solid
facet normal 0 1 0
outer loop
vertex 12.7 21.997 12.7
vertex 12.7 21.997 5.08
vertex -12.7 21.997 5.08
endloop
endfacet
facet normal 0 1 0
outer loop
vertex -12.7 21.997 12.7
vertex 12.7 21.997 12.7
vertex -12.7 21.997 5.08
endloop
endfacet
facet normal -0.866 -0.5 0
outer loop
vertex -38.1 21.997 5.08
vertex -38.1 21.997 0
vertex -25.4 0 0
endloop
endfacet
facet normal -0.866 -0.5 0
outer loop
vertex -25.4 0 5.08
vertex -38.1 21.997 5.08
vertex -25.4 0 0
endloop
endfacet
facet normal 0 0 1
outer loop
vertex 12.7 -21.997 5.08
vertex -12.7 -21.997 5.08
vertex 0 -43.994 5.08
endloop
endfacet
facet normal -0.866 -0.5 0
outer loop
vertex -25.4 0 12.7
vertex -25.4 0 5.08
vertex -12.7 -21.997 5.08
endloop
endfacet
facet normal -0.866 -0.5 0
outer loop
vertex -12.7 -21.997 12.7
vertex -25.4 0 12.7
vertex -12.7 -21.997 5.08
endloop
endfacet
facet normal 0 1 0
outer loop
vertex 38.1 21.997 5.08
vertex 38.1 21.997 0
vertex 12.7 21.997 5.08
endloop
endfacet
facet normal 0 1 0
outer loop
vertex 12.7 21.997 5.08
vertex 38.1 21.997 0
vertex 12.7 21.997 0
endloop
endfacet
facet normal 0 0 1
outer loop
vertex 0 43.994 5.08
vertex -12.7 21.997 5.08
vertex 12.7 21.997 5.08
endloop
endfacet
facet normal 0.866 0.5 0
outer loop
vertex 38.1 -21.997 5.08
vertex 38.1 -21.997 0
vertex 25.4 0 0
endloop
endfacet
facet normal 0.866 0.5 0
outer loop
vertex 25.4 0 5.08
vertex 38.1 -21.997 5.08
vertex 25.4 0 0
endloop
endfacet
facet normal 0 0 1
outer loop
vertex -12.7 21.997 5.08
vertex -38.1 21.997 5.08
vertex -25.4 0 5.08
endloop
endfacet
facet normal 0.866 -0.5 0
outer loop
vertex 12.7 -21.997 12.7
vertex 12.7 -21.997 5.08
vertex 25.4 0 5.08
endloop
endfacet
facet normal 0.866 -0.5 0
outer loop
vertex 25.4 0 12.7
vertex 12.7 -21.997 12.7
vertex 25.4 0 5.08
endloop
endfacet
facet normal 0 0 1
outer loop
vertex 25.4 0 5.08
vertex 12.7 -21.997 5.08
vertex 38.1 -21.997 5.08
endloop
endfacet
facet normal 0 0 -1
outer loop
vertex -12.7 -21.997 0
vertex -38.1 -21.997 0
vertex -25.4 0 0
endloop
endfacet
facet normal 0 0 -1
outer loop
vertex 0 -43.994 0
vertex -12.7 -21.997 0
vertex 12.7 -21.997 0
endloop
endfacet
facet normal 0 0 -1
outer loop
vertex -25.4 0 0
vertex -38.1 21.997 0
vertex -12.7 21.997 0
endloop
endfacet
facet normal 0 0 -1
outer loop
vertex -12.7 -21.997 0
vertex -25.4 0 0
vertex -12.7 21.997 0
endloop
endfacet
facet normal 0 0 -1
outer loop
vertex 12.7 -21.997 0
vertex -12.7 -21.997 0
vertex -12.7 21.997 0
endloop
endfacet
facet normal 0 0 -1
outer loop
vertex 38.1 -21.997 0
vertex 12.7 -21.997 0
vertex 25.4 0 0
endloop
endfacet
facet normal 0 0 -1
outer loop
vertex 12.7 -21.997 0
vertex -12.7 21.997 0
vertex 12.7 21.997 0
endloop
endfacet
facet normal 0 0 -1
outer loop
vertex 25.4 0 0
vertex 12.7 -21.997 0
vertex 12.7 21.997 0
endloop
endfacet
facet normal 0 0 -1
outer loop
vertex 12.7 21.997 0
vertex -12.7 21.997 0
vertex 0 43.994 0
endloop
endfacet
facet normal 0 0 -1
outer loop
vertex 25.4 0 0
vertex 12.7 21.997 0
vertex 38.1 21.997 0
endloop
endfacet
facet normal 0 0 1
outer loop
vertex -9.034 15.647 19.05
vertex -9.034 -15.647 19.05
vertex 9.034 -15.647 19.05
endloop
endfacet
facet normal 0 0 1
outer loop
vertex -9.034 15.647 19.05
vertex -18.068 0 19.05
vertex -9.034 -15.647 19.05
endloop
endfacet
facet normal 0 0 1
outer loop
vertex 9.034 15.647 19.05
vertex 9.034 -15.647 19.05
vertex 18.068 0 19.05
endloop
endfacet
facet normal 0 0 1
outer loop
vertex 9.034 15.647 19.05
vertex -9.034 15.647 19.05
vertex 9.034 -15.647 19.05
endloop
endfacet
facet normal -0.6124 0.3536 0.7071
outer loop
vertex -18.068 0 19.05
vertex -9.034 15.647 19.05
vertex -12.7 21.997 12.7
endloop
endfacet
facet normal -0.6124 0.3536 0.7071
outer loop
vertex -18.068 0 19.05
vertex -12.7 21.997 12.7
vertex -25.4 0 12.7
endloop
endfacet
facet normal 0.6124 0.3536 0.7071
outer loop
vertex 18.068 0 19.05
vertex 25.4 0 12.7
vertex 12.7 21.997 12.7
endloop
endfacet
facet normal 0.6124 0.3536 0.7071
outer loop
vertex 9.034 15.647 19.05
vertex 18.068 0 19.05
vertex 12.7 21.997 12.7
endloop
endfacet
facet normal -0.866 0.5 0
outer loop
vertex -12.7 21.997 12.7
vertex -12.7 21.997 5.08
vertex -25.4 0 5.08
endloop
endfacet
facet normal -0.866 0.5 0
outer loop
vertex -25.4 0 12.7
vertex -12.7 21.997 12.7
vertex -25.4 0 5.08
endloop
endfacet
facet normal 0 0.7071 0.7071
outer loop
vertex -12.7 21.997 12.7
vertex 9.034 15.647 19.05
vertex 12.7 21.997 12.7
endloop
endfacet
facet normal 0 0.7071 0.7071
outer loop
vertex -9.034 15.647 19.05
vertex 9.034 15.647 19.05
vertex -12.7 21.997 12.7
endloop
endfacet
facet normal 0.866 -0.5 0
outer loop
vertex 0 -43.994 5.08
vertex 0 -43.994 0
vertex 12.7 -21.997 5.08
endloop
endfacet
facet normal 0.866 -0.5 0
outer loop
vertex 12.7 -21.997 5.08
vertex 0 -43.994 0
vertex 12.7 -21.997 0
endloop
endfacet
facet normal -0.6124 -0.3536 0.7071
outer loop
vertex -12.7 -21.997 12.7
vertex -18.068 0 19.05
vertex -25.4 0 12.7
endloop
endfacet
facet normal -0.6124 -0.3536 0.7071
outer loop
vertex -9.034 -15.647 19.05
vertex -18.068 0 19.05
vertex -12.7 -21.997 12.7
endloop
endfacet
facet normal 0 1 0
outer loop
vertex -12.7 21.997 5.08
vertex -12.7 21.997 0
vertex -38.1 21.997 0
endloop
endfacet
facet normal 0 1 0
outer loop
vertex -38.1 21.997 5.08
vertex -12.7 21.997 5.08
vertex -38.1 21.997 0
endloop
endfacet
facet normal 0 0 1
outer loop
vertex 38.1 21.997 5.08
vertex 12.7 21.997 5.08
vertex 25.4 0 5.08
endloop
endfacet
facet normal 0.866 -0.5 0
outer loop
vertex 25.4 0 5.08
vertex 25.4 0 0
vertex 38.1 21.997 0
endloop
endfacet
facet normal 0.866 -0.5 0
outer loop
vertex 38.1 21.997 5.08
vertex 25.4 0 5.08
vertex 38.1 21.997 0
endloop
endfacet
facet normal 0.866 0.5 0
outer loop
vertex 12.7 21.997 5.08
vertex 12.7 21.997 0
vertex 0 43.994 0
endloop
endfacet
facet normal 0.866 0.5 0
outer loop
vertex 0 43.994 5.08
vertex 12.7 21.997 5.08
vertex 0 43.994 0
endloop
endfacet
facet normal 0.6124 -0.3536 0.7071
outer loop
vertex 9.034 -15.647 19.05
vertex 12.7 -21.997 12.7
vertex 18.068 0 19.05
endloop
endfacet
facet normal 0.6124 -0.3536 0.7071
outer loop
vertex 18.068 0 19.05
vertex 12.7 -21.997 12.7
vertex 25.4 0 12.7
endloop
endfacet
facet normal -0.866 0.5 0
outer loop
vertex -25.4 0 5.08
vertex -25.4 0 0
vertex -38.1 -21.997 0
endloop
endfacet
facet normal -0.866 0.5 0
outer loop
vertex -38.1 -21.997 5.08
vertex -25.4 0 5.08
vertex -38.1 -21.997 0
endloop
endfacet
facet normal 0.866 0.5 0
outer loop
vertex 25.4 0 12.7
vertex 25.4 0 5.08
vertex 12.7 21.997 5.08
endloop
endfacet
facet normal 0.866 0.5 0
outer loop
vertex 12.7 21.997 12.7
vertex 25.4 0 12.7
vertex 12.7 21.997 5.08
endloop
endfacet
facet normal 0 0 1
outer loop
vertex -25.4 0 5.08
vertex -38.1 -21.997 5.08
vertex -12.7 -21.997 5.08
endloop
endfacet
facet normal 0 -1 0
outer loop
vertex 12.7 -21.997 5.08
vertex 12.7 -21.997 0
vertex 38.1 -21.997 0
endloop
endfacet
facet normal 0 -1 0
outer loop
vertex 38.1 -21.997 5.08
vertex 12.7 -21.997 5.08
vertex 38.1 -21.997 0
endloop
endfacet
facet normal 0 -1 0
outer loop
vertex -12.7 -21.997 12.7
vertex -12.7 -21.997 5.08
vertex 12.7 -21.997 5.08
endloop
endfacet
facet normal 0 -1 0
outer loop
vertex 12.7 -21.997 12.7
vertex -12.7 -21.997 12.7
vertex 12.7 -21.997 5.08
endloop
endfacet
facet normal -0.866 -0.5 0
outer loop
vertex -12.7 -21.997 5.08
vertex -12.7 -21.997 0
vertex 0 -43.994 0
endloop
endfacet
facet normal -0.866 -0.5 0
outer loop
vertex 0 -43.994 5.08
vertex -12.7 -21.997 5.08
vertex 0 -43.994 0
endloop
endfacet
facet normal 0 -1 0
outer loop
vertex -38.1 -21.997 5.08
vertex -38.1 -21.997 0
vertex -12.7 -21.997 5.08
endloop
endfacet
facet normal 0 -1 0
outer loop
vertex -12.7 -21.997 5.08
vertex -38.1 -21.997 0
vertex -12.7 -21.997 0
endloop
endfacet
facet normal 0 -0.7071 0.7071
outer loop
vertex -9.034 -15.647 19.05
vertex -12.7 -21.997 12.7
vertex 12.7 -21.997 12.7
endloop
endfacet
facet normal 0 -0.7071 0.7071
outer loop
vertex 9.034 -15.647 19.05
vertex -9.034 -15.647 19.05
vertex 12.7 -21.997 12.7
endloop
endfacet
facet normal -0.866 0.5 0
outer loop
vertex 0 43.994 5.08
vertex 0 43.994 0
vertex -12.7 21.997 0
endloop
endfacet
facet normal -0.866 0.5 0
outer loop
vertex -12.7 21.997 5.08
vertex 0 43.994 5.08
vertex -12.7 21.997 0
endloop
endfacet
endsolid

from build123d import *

# Parameters (mm, degrees)
F1_DEPTH = 19.05
F2_DEPTH = 5.08
F3_SIZE  = 6.35


with BuildPart() as f1:
    # F0 (on Top) → F1 (new body)
    with BuildSketch(Plane.XY):
        Polygon((12.7, 21.9970452561), (-12.7, 21.9970452561), (-25.4, 0), (-12.7, -21.9970452561), (12.7, -21.9970452561), (25.4, 0), align=None)
    extrude(amount=F1_DEPTH)

    # F0 (on Top) → F2 (join)
    with BuildSketch(Plane.XY):
        Polygon((-12.7, 21.9970452561), (-38.1, 21.9970452561), (-25.4, 0), align=None)
        Polygon((0, 43.9940905122), (-12.7, 21.9970452561), (12.7, 21.9970452561), align=None)
        Polygon((12.7, 21.9970452561), (-12.7, 21.9970452561), (-25.4, 0), (-12.7, -21.9970452561), (12.7, -21.9970452561), (25.4, 0), align=None)
        Polygon((-12.7, -21.9970452561), (-25.4, 0), (-38.1, -21.9970452561), align=None)
        Polygon((38.1, 21.9970452561), (12.7, 21.9970452561), (25.4, 0), align=None)
        Polygon((12.7, -21.9970452561), (-12.7, -21.9970452561), (0, -43.9940905122), align=None)
        Polygon((38.1, -21.9970452561), (25.4, 0), (12.7, -21.9970452561), align=None)
    extrude(amount=F2_DEPTH)

    # F3
    f3_edges = [f1.edges().sort_by_distance(p)[0] for p in [
        (0, -21.997045, 19.05),
        (19.05, -10.998523, 19.05),
        (19.05, 10.998523, 19.05),
        (0, 21.997045, 19.05),
        (-19.05, 10.998523, 19.05),
        (-19.05, -10.998523, 19.05),
    ]]
    chamfer(f3_edges, length=F3_SIZE)


solid = f1.part
